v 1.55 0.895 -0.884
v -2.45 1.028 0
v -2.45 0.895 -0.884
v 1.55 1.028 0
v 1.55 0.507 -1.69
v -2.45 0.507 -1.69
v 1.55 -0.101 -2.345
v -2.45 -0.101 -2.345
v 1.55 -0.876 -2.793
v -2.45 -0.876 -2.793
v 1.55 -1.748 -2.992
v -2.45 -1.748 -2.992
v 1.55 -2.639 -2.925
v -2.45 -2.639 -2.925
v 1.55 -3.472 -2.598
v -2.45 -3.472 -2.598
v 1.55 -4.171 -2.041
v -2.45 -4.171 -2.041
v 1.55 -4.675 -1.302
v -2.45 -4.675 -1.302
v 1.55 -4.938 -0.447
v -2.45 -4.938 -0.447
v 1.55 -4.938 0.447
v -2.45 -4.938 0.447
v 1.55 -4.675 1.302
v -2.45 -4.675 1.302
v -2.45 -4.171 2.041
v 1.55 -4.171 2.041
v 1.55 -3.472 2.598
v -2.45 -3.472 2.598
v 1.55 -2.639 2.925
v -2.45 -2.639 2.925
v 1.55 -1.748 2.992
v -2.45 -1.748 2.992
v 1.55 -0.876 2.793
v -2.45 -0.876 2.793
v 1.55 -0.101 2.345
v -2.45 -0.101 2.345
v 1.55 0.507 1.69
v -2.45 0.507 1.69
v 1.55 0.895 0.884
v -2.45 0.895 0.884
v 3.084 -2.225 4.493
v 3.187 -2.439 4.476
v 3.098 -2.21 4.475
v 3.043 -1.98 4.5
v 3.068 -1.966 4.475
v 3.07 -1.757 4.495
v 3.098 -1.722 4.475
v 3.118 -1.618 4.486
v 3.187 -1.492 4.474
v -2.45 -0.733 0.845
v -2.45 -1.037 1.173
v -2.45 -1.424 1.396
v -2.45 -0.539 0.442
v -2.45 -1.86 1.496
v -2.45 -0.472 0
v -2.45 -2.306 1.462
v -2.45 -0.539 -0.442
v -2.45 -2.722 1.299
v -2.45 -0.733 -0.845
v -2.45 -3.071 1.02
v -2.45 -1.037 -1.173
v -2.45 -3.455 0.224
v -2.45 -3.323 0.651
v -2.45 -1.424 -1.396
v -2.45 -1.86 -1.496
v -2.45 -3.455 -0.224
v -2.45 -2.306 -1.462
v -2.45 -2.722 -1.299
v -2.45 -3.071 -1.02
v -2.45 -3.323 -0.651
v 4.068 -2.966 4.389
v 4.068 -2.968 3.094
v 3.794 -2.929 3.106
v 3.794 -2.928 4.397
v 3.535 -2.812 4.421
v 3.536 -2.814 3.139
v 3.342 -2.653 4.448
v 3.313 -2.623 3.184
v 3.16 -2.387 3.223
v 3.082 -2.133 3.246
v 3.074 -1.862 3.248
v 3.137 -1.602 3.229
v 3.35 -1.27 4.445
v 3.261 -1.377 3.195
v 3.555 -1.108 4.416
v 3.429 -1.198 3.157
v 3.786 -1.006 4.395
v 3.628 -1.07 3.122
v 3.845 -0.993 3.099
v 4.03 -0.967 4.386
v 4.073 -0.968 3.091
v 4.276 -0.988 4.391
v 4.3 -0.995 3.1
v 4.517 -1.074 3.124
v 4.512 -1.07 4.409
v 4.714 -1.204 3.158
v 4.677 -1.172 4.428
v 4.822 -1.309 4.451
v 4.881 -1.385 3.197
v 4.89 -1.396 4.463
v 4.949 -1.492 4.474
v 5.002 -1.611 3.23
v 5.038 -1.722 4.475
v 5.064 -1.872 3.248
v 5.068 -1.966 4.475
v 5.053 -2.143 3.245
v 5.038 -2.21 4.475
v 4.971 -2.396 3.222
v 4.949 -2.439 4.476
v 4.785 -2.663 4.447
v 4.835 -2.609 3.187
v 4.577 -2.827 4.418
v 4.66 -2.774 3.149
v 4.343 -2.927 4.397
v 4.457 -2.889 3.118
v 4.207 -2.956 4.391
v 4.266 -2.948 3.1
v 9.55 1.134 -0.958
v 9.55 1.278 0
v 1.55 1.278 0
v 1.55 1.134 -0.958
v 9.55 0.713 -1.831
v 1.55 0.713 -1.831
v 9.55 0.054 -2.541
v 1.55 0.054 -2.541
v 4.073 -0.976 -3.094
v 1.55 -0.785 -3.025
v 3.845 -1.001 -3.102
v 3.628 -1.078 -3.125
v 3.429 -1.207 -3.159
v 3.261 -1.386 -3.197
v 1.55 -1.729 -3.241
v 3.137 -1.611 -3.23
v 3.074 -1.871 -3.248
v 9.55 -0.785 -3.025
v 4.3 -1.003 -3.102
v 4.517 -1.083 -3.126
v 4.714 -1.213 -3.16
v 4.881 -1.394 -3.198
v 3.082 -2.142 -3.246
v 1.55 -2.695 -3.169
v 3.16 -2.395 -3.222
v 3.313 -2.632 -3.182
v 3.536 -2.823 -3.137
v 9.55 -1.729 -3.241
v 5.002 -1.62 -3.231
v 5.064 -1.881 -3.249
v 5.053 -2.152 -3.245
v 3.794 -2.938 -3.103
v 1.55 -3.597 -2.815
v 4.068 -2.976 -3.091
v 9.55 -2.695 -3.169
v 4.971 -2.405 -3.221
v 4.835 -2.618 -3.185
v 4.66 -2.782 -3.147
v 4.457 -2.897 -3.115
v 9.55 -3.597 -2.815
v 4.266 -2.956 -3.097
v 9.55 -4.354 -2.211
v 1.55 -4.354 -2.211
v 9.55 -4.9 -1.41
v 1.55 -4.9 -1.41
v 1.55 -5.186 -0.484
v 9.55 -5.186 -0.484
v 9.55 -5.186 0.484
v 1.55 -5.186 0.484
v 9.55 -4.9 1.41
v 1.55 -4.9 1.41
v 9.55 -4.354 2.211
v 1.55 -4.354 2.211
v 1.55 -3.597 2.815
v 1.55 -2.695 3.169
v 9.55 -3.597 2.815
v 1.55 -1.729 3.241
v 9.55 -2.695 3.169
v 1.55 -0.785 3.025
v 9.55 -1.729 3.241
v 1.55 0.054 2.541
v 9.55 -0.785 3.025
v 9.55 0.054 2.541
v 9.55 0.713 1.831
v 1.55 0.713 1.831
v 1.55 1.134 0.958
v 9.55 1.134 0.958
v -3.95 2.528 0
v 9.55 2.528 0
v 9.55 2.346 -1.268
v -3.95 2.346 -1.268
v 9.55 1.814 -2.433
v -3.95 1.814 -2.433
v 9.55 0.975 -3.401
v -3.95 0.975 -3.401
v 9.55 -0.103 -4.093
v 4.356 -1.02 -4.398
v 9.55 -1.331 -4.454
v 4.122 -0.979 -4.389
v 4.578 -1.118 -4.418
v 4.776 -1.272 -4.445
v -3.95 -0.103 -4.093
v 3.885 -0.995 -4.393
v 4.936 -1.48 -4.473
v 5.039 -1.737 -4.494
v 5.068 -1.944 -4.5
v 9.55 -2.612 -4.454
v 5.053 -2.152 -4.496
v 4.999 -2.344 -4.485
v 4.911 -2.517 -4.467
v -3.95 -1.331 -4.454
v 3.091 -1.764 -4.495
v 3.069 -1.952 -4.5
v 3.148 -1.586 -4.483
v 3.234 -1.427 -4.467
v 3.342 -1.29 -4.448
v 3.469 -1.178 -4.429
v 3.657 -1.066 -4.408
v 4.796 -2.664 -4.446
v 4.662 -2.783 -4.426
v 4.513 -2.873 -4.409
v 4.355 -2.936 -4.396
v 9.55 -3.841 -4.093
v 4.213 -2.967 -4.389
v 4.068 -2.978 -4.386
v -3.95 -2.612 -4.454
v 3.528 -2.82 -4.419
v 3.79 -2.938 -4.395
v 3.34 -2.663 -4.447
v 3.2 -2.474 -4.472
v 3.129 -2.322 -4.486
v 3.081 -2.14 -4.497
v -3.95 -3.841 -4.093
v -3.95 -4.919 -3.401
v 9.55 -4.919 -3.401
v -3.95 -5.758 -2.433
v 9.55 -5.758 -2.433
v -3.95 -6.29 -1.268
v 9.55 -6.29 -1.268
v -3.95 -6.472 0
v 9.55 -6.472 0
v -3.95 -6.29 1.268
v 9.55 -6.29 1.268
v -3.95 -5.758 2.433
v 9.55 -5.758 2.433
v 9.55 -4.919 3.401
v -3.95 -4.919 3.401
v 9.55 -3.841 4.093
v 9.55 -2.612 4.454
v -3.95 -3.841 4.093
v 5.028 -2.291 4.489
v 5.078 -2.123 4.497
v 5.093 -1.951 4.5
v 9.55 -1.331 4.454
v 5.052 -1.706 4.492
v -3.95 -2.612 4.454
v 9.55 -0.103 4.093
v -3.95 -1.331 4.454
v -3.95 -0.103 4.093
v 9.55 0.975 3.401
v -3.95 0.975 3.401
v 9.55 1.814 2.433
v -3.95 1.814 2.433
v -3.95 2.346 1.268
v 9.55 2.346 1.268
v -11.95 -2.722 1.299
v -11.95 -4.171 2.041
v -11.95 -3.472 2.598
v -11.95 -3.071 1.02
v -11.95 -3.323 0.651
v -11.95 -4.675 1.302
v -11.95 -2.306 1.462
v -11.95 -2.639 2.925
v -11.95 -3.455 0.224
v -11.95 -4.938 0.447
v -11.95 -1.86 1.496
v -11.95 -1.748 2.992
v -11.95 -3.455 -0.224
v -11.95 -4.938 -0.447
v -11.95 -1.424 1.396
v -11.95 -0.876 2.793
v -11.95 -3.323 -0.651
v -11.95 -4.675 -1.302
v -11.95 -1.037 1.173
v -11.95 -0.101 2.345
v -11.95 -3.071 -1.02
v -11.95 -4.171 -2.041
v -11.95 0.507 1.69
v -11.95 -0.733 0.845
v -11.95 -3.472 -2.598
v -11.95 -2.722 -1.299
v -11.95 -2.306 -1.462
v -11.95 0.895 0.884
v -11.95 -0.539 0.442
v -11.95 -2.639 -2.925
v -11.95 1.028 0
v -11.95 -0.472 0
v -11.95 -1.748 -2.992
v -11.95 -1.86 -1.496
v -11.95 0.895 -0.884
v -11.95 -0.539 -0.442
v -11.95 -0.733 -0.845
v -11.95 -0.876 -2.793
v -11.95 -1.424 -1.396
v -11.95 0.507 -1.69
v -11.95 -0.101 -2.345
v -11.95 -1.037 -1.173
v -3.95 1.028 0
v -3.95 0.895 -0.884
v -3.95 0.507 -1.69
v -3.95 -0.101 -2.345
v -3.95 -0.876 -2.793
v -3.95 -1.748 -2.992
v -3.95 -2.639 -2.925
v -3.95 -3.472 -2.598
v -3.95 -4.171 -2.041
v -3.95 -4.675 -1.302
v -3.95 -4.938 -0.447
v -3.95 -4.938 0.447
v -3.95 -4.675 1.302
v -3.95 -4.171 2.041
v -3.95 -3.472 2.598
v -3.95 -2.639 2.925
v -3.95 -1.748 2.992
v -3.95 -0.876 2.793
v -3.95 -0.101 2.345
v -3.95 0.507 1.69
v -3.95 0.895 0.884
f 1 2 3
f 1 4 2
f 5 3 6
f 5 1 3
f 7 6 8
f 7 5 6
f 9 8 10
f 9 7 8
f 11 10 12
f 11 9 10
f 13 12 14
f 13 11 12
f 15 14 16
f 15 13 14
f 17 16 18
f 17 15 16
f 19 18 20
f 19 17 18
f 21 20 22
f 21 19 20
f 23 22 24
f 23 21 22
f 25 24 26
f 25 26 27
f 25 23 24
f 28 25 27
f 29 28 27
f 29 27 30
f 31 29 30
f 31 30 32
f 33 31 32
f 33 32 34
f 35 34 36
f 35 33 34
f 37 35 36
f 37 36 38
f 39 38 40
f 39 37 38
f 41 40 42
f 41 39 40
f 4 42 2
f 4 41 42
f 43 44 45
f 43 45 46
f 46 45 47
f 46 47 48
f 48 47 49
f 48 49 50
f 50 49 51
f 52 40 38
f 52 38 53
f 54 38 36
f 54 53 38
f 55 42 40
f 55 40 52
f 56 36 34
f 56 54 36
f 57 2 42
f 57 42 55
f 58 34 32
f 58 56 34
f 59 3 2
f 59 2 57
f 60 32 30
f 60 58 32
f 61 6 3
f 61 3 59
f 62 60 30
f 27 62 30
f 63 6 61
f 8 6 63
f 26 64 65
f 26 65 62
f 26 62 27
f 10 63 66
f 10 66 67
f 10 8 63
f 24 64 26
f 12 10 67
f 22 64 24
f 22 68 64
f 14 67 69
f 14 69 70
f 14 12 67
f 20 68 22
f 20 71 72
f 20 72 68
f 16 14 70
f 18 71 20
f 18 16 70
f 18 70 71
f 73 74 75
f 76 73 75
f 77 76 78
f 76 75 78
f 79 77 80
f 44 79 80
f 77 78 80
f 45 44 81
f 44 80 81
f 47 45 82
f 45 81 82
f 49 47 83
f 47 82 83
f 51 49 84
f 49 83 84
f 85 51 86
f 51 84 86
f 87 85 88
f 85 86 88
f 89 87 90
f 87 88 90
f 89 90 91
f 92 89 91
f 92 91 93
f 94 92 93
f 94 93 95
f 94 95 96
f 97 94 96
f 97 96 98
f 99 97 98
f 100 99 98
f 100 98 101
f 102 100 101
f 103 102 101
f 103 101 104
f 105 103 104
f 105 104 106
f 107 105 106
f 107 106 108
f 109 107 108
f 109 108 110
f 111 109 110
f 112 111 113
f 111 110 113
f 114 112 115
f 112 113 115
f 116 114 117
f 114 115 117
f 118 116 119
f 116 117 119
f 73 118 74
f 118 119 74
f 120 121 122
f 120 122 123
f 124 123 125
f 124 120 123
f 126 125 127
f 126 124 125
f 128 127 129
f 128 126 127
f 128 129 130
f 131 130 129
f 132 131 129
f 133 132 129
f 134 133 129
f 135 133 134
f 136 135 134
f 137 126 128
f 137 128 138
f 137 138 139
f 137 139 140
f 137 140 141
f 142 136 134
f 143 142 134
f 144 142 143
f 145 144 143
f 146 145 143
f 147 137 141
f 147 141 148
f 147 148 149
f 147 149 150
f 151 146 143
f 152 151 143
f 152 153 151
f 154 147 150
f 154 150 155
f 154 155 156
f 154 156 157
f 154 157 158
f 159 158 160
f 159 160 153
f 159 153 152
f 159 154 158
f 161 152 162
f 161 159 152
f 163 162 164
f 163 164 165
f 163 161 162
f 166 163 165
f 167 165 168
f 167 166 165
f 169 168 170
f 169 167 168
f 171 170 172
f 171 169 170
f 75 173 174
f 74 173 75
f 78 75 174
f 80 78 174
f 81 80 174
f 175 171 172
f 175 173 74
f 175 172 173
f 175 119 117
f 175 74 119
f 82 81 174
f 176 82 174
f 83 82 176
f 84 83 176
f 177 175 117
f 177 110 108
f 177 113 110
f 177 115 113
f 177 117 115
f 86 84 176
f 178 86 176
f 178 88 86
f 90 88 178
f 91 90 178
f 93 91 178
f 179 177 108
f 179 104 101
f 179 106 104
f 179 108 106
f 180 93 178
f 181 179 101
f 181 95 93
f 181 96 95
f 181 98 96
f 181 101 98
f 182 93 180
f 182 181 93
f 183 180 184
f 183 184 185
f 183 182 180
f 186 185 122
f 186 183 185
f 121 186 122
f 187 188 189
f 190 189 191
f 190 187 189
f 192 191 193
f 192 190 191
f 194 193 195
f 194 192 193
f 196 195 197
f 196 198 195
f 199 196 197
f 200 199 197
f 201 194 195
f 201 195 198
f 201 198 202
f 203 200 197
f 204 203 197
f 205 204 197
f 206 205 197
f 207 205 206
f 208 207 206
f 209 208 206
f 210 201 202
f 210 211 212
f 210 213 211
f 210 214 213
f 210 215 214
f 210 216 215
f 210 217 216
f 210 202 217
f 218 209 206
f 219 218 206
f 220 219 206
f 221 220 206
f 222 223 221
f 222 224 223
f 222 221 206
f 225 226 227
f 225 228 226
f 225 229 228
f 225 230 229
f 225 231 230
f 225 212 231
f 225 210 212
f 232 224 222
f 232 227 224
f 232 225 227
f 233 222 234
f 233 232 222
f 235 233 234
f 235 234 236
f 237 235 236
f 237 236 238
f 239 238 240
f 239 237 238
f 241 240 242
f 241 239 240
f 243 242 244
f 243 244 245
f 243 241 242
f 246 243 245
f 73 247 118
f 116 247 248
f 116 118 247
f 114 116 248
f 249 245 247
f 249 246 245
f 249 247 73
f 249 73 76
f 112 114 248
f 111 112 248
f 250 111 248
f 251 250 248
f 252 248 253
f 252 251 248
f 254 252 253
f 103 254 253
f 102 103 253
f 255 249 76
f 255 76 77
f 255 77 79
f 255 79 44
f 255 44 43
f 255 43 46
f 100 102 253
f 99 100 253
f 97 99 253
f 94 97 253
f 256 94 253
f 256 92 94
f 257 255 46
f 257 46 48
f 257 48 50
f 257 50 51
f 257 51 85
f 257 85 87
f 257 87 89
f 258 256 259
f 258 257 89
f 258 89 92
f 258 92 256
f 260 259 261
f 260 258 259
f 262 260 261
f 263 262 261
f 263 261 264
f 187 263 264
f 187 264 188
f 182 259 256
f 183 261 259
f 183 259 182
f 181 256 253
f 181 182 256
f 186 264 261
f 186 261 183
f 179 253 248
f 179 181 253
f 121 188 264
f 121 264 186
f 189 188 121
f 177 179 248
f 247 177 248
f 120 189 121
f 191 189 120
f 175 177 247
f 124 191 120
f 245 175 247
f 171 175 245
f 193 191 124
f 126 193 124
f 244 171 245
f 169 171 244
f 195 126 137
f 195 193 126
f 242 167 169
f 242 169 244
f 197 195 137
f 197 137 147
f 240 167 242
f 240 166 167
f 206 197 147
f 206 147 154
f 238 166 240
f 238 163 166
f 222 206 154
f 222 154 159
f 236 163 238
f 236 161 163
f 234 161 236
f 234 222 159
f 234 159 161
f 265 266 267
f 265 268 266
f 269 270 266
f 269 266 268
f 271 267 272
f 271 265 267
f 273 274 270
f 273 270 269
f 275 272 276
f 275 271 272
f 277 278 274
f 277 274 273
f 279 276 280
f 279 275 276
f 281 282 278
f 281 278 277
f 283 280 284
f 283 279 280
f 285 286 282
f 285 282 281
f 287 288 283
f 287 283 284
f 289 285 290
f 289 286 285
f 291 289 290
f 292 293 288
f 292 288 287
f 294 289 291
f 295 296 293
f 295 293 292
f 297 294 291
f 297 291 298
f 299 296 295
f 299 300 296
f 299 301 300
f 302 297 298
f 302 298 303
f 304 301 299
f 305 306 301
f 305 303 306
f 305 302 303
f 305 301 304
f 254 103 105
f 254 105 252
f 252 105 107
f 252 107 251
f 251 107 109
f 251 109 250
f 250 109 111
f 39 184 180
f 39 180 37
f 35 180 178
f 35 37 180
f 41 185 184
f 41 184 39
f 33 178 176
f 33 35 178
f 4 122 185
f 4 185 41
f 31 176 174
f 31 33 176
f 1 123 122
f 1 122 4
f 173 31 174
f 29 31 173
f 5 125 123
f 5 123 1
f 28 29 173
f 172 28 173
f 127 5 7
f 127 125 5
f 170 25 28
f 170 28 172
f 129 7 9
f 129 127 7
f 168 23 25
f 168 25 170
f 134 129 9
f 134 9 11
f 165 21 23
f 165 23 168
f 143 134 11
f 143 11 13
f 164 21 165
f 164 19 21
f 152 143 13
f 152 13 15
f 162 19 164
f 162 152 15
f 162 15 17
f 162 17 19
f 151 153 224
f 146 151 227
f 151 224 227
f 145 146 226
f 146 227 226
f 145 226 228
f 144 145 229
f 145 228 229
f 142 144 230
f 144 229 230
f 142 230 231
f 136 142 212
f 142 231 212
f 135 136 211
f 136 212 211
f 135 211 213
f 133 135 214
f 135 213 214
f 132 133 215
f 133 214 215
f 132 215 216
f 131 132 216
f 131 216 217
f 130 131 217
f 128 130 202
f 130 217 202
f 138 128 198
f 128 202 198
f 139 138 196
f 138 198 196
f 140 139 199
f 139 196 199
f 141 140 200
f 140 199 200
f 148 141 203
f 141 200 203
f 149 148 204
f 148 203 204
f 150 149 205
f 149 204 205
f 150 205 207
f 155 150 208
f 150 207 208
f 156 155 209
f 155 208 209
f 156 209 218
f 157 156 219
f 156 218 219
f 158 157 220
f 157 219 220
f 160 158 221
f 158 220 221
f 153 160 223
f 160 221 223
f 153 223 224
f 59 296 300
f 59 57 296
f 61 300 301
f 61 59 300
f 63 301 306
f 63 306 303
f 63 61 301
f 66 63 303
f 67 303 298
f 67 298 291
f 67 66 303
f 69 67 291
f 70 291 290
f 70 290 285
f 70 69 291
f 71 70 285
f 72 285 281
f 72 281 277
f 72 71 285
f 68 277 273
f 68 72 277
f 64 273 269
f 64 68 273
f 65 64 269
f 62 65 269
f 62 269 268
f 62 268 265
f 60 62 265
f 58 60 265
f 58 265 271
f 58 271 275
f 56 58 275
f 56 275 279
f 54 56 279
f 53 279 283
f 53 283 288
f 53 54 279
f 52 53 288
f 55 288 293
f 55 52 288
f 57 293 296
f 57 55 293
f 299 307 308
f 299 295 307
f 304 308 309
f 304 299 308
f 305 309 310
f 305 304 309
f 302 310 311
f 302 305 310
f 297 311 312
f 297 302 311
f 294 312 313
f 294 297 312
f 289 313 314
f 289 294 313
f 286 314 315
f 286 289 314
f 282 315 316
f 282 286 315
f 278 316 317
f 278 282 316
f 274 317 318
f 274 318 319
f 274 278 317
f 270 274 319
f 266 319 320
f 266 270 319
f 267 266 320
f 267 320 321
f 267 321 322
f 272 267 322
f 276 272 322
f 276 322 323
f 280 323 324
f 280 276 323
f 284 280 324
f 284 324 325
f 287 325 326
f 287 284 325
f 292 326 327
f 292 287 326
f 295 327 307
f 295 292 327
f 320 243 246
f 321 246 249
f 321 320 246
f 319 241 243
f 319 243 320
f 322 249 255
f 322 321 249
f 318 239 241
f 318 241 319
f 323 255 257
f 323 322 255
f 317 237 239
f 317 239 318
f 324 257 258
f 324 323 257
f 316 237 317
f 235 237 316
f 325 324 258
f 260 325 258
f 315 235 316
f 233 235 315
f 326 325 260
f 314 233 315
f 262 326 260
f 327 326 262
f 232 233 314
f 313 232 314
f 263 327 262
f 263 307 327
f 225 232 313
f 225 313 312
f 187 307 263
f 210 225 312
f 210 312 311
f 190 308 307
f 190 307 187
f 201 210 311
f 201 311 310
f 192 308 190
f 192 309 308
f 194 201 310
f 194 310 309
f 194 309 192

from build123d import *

# Parameters (mm, degrees)
F_2_0_2_DIAMETER_HOLE1_D           = 2
F_2_0_2_DIAMETER_HOLE1_CSINK_D     = 2.05
F_2_0_2_DIAMETER_HOLE1_CSINK_ANGLE = 90


with BuildPart() as part:
    # Sketch1 → Revolve1 (revolve)
    with BuildSketch(Plane.XY):
        Polygon((9.549685022, 1.278125845), (9.549685022, 2.528125845), (-2.450314978, 2.528125845), (-3.950314978, 2.528125845), (-3.950314978, 1.028125845), (-11.950314978, 1.028125845), (-11.950314978, -0.471874155), (-2.450314978, -0.471874155), (-2.450314978, 1.028125845), (1.549685022, 1.028125845), (1.549685022, 1.278125845), align=None)
    revolve(axis=Axis((0, -1.971874155, 0), (-1, 0, 0)))

    # Ø2.0 (2) Diameter Hole1 (through all)
    with Locations(Plane(origin=(4.068165659, -1.965730097, 4.499995806), x_dir=(0, 0.999999068, -0.001365346), z_dir=(0, 0.001365346, 0.999999068))):
        with Locations((0, 0)):
            CounterSinkHole(F_2_0_2_DIAMETER_HOLE1_D / 2, F_2_0_2_DIAMETER_HOLE1_CSINK_D / 2, counter_sink_angle=F_2_0_2_DIAMETER_HOLE1_CSINK_ANGLE)


solid = part.part
